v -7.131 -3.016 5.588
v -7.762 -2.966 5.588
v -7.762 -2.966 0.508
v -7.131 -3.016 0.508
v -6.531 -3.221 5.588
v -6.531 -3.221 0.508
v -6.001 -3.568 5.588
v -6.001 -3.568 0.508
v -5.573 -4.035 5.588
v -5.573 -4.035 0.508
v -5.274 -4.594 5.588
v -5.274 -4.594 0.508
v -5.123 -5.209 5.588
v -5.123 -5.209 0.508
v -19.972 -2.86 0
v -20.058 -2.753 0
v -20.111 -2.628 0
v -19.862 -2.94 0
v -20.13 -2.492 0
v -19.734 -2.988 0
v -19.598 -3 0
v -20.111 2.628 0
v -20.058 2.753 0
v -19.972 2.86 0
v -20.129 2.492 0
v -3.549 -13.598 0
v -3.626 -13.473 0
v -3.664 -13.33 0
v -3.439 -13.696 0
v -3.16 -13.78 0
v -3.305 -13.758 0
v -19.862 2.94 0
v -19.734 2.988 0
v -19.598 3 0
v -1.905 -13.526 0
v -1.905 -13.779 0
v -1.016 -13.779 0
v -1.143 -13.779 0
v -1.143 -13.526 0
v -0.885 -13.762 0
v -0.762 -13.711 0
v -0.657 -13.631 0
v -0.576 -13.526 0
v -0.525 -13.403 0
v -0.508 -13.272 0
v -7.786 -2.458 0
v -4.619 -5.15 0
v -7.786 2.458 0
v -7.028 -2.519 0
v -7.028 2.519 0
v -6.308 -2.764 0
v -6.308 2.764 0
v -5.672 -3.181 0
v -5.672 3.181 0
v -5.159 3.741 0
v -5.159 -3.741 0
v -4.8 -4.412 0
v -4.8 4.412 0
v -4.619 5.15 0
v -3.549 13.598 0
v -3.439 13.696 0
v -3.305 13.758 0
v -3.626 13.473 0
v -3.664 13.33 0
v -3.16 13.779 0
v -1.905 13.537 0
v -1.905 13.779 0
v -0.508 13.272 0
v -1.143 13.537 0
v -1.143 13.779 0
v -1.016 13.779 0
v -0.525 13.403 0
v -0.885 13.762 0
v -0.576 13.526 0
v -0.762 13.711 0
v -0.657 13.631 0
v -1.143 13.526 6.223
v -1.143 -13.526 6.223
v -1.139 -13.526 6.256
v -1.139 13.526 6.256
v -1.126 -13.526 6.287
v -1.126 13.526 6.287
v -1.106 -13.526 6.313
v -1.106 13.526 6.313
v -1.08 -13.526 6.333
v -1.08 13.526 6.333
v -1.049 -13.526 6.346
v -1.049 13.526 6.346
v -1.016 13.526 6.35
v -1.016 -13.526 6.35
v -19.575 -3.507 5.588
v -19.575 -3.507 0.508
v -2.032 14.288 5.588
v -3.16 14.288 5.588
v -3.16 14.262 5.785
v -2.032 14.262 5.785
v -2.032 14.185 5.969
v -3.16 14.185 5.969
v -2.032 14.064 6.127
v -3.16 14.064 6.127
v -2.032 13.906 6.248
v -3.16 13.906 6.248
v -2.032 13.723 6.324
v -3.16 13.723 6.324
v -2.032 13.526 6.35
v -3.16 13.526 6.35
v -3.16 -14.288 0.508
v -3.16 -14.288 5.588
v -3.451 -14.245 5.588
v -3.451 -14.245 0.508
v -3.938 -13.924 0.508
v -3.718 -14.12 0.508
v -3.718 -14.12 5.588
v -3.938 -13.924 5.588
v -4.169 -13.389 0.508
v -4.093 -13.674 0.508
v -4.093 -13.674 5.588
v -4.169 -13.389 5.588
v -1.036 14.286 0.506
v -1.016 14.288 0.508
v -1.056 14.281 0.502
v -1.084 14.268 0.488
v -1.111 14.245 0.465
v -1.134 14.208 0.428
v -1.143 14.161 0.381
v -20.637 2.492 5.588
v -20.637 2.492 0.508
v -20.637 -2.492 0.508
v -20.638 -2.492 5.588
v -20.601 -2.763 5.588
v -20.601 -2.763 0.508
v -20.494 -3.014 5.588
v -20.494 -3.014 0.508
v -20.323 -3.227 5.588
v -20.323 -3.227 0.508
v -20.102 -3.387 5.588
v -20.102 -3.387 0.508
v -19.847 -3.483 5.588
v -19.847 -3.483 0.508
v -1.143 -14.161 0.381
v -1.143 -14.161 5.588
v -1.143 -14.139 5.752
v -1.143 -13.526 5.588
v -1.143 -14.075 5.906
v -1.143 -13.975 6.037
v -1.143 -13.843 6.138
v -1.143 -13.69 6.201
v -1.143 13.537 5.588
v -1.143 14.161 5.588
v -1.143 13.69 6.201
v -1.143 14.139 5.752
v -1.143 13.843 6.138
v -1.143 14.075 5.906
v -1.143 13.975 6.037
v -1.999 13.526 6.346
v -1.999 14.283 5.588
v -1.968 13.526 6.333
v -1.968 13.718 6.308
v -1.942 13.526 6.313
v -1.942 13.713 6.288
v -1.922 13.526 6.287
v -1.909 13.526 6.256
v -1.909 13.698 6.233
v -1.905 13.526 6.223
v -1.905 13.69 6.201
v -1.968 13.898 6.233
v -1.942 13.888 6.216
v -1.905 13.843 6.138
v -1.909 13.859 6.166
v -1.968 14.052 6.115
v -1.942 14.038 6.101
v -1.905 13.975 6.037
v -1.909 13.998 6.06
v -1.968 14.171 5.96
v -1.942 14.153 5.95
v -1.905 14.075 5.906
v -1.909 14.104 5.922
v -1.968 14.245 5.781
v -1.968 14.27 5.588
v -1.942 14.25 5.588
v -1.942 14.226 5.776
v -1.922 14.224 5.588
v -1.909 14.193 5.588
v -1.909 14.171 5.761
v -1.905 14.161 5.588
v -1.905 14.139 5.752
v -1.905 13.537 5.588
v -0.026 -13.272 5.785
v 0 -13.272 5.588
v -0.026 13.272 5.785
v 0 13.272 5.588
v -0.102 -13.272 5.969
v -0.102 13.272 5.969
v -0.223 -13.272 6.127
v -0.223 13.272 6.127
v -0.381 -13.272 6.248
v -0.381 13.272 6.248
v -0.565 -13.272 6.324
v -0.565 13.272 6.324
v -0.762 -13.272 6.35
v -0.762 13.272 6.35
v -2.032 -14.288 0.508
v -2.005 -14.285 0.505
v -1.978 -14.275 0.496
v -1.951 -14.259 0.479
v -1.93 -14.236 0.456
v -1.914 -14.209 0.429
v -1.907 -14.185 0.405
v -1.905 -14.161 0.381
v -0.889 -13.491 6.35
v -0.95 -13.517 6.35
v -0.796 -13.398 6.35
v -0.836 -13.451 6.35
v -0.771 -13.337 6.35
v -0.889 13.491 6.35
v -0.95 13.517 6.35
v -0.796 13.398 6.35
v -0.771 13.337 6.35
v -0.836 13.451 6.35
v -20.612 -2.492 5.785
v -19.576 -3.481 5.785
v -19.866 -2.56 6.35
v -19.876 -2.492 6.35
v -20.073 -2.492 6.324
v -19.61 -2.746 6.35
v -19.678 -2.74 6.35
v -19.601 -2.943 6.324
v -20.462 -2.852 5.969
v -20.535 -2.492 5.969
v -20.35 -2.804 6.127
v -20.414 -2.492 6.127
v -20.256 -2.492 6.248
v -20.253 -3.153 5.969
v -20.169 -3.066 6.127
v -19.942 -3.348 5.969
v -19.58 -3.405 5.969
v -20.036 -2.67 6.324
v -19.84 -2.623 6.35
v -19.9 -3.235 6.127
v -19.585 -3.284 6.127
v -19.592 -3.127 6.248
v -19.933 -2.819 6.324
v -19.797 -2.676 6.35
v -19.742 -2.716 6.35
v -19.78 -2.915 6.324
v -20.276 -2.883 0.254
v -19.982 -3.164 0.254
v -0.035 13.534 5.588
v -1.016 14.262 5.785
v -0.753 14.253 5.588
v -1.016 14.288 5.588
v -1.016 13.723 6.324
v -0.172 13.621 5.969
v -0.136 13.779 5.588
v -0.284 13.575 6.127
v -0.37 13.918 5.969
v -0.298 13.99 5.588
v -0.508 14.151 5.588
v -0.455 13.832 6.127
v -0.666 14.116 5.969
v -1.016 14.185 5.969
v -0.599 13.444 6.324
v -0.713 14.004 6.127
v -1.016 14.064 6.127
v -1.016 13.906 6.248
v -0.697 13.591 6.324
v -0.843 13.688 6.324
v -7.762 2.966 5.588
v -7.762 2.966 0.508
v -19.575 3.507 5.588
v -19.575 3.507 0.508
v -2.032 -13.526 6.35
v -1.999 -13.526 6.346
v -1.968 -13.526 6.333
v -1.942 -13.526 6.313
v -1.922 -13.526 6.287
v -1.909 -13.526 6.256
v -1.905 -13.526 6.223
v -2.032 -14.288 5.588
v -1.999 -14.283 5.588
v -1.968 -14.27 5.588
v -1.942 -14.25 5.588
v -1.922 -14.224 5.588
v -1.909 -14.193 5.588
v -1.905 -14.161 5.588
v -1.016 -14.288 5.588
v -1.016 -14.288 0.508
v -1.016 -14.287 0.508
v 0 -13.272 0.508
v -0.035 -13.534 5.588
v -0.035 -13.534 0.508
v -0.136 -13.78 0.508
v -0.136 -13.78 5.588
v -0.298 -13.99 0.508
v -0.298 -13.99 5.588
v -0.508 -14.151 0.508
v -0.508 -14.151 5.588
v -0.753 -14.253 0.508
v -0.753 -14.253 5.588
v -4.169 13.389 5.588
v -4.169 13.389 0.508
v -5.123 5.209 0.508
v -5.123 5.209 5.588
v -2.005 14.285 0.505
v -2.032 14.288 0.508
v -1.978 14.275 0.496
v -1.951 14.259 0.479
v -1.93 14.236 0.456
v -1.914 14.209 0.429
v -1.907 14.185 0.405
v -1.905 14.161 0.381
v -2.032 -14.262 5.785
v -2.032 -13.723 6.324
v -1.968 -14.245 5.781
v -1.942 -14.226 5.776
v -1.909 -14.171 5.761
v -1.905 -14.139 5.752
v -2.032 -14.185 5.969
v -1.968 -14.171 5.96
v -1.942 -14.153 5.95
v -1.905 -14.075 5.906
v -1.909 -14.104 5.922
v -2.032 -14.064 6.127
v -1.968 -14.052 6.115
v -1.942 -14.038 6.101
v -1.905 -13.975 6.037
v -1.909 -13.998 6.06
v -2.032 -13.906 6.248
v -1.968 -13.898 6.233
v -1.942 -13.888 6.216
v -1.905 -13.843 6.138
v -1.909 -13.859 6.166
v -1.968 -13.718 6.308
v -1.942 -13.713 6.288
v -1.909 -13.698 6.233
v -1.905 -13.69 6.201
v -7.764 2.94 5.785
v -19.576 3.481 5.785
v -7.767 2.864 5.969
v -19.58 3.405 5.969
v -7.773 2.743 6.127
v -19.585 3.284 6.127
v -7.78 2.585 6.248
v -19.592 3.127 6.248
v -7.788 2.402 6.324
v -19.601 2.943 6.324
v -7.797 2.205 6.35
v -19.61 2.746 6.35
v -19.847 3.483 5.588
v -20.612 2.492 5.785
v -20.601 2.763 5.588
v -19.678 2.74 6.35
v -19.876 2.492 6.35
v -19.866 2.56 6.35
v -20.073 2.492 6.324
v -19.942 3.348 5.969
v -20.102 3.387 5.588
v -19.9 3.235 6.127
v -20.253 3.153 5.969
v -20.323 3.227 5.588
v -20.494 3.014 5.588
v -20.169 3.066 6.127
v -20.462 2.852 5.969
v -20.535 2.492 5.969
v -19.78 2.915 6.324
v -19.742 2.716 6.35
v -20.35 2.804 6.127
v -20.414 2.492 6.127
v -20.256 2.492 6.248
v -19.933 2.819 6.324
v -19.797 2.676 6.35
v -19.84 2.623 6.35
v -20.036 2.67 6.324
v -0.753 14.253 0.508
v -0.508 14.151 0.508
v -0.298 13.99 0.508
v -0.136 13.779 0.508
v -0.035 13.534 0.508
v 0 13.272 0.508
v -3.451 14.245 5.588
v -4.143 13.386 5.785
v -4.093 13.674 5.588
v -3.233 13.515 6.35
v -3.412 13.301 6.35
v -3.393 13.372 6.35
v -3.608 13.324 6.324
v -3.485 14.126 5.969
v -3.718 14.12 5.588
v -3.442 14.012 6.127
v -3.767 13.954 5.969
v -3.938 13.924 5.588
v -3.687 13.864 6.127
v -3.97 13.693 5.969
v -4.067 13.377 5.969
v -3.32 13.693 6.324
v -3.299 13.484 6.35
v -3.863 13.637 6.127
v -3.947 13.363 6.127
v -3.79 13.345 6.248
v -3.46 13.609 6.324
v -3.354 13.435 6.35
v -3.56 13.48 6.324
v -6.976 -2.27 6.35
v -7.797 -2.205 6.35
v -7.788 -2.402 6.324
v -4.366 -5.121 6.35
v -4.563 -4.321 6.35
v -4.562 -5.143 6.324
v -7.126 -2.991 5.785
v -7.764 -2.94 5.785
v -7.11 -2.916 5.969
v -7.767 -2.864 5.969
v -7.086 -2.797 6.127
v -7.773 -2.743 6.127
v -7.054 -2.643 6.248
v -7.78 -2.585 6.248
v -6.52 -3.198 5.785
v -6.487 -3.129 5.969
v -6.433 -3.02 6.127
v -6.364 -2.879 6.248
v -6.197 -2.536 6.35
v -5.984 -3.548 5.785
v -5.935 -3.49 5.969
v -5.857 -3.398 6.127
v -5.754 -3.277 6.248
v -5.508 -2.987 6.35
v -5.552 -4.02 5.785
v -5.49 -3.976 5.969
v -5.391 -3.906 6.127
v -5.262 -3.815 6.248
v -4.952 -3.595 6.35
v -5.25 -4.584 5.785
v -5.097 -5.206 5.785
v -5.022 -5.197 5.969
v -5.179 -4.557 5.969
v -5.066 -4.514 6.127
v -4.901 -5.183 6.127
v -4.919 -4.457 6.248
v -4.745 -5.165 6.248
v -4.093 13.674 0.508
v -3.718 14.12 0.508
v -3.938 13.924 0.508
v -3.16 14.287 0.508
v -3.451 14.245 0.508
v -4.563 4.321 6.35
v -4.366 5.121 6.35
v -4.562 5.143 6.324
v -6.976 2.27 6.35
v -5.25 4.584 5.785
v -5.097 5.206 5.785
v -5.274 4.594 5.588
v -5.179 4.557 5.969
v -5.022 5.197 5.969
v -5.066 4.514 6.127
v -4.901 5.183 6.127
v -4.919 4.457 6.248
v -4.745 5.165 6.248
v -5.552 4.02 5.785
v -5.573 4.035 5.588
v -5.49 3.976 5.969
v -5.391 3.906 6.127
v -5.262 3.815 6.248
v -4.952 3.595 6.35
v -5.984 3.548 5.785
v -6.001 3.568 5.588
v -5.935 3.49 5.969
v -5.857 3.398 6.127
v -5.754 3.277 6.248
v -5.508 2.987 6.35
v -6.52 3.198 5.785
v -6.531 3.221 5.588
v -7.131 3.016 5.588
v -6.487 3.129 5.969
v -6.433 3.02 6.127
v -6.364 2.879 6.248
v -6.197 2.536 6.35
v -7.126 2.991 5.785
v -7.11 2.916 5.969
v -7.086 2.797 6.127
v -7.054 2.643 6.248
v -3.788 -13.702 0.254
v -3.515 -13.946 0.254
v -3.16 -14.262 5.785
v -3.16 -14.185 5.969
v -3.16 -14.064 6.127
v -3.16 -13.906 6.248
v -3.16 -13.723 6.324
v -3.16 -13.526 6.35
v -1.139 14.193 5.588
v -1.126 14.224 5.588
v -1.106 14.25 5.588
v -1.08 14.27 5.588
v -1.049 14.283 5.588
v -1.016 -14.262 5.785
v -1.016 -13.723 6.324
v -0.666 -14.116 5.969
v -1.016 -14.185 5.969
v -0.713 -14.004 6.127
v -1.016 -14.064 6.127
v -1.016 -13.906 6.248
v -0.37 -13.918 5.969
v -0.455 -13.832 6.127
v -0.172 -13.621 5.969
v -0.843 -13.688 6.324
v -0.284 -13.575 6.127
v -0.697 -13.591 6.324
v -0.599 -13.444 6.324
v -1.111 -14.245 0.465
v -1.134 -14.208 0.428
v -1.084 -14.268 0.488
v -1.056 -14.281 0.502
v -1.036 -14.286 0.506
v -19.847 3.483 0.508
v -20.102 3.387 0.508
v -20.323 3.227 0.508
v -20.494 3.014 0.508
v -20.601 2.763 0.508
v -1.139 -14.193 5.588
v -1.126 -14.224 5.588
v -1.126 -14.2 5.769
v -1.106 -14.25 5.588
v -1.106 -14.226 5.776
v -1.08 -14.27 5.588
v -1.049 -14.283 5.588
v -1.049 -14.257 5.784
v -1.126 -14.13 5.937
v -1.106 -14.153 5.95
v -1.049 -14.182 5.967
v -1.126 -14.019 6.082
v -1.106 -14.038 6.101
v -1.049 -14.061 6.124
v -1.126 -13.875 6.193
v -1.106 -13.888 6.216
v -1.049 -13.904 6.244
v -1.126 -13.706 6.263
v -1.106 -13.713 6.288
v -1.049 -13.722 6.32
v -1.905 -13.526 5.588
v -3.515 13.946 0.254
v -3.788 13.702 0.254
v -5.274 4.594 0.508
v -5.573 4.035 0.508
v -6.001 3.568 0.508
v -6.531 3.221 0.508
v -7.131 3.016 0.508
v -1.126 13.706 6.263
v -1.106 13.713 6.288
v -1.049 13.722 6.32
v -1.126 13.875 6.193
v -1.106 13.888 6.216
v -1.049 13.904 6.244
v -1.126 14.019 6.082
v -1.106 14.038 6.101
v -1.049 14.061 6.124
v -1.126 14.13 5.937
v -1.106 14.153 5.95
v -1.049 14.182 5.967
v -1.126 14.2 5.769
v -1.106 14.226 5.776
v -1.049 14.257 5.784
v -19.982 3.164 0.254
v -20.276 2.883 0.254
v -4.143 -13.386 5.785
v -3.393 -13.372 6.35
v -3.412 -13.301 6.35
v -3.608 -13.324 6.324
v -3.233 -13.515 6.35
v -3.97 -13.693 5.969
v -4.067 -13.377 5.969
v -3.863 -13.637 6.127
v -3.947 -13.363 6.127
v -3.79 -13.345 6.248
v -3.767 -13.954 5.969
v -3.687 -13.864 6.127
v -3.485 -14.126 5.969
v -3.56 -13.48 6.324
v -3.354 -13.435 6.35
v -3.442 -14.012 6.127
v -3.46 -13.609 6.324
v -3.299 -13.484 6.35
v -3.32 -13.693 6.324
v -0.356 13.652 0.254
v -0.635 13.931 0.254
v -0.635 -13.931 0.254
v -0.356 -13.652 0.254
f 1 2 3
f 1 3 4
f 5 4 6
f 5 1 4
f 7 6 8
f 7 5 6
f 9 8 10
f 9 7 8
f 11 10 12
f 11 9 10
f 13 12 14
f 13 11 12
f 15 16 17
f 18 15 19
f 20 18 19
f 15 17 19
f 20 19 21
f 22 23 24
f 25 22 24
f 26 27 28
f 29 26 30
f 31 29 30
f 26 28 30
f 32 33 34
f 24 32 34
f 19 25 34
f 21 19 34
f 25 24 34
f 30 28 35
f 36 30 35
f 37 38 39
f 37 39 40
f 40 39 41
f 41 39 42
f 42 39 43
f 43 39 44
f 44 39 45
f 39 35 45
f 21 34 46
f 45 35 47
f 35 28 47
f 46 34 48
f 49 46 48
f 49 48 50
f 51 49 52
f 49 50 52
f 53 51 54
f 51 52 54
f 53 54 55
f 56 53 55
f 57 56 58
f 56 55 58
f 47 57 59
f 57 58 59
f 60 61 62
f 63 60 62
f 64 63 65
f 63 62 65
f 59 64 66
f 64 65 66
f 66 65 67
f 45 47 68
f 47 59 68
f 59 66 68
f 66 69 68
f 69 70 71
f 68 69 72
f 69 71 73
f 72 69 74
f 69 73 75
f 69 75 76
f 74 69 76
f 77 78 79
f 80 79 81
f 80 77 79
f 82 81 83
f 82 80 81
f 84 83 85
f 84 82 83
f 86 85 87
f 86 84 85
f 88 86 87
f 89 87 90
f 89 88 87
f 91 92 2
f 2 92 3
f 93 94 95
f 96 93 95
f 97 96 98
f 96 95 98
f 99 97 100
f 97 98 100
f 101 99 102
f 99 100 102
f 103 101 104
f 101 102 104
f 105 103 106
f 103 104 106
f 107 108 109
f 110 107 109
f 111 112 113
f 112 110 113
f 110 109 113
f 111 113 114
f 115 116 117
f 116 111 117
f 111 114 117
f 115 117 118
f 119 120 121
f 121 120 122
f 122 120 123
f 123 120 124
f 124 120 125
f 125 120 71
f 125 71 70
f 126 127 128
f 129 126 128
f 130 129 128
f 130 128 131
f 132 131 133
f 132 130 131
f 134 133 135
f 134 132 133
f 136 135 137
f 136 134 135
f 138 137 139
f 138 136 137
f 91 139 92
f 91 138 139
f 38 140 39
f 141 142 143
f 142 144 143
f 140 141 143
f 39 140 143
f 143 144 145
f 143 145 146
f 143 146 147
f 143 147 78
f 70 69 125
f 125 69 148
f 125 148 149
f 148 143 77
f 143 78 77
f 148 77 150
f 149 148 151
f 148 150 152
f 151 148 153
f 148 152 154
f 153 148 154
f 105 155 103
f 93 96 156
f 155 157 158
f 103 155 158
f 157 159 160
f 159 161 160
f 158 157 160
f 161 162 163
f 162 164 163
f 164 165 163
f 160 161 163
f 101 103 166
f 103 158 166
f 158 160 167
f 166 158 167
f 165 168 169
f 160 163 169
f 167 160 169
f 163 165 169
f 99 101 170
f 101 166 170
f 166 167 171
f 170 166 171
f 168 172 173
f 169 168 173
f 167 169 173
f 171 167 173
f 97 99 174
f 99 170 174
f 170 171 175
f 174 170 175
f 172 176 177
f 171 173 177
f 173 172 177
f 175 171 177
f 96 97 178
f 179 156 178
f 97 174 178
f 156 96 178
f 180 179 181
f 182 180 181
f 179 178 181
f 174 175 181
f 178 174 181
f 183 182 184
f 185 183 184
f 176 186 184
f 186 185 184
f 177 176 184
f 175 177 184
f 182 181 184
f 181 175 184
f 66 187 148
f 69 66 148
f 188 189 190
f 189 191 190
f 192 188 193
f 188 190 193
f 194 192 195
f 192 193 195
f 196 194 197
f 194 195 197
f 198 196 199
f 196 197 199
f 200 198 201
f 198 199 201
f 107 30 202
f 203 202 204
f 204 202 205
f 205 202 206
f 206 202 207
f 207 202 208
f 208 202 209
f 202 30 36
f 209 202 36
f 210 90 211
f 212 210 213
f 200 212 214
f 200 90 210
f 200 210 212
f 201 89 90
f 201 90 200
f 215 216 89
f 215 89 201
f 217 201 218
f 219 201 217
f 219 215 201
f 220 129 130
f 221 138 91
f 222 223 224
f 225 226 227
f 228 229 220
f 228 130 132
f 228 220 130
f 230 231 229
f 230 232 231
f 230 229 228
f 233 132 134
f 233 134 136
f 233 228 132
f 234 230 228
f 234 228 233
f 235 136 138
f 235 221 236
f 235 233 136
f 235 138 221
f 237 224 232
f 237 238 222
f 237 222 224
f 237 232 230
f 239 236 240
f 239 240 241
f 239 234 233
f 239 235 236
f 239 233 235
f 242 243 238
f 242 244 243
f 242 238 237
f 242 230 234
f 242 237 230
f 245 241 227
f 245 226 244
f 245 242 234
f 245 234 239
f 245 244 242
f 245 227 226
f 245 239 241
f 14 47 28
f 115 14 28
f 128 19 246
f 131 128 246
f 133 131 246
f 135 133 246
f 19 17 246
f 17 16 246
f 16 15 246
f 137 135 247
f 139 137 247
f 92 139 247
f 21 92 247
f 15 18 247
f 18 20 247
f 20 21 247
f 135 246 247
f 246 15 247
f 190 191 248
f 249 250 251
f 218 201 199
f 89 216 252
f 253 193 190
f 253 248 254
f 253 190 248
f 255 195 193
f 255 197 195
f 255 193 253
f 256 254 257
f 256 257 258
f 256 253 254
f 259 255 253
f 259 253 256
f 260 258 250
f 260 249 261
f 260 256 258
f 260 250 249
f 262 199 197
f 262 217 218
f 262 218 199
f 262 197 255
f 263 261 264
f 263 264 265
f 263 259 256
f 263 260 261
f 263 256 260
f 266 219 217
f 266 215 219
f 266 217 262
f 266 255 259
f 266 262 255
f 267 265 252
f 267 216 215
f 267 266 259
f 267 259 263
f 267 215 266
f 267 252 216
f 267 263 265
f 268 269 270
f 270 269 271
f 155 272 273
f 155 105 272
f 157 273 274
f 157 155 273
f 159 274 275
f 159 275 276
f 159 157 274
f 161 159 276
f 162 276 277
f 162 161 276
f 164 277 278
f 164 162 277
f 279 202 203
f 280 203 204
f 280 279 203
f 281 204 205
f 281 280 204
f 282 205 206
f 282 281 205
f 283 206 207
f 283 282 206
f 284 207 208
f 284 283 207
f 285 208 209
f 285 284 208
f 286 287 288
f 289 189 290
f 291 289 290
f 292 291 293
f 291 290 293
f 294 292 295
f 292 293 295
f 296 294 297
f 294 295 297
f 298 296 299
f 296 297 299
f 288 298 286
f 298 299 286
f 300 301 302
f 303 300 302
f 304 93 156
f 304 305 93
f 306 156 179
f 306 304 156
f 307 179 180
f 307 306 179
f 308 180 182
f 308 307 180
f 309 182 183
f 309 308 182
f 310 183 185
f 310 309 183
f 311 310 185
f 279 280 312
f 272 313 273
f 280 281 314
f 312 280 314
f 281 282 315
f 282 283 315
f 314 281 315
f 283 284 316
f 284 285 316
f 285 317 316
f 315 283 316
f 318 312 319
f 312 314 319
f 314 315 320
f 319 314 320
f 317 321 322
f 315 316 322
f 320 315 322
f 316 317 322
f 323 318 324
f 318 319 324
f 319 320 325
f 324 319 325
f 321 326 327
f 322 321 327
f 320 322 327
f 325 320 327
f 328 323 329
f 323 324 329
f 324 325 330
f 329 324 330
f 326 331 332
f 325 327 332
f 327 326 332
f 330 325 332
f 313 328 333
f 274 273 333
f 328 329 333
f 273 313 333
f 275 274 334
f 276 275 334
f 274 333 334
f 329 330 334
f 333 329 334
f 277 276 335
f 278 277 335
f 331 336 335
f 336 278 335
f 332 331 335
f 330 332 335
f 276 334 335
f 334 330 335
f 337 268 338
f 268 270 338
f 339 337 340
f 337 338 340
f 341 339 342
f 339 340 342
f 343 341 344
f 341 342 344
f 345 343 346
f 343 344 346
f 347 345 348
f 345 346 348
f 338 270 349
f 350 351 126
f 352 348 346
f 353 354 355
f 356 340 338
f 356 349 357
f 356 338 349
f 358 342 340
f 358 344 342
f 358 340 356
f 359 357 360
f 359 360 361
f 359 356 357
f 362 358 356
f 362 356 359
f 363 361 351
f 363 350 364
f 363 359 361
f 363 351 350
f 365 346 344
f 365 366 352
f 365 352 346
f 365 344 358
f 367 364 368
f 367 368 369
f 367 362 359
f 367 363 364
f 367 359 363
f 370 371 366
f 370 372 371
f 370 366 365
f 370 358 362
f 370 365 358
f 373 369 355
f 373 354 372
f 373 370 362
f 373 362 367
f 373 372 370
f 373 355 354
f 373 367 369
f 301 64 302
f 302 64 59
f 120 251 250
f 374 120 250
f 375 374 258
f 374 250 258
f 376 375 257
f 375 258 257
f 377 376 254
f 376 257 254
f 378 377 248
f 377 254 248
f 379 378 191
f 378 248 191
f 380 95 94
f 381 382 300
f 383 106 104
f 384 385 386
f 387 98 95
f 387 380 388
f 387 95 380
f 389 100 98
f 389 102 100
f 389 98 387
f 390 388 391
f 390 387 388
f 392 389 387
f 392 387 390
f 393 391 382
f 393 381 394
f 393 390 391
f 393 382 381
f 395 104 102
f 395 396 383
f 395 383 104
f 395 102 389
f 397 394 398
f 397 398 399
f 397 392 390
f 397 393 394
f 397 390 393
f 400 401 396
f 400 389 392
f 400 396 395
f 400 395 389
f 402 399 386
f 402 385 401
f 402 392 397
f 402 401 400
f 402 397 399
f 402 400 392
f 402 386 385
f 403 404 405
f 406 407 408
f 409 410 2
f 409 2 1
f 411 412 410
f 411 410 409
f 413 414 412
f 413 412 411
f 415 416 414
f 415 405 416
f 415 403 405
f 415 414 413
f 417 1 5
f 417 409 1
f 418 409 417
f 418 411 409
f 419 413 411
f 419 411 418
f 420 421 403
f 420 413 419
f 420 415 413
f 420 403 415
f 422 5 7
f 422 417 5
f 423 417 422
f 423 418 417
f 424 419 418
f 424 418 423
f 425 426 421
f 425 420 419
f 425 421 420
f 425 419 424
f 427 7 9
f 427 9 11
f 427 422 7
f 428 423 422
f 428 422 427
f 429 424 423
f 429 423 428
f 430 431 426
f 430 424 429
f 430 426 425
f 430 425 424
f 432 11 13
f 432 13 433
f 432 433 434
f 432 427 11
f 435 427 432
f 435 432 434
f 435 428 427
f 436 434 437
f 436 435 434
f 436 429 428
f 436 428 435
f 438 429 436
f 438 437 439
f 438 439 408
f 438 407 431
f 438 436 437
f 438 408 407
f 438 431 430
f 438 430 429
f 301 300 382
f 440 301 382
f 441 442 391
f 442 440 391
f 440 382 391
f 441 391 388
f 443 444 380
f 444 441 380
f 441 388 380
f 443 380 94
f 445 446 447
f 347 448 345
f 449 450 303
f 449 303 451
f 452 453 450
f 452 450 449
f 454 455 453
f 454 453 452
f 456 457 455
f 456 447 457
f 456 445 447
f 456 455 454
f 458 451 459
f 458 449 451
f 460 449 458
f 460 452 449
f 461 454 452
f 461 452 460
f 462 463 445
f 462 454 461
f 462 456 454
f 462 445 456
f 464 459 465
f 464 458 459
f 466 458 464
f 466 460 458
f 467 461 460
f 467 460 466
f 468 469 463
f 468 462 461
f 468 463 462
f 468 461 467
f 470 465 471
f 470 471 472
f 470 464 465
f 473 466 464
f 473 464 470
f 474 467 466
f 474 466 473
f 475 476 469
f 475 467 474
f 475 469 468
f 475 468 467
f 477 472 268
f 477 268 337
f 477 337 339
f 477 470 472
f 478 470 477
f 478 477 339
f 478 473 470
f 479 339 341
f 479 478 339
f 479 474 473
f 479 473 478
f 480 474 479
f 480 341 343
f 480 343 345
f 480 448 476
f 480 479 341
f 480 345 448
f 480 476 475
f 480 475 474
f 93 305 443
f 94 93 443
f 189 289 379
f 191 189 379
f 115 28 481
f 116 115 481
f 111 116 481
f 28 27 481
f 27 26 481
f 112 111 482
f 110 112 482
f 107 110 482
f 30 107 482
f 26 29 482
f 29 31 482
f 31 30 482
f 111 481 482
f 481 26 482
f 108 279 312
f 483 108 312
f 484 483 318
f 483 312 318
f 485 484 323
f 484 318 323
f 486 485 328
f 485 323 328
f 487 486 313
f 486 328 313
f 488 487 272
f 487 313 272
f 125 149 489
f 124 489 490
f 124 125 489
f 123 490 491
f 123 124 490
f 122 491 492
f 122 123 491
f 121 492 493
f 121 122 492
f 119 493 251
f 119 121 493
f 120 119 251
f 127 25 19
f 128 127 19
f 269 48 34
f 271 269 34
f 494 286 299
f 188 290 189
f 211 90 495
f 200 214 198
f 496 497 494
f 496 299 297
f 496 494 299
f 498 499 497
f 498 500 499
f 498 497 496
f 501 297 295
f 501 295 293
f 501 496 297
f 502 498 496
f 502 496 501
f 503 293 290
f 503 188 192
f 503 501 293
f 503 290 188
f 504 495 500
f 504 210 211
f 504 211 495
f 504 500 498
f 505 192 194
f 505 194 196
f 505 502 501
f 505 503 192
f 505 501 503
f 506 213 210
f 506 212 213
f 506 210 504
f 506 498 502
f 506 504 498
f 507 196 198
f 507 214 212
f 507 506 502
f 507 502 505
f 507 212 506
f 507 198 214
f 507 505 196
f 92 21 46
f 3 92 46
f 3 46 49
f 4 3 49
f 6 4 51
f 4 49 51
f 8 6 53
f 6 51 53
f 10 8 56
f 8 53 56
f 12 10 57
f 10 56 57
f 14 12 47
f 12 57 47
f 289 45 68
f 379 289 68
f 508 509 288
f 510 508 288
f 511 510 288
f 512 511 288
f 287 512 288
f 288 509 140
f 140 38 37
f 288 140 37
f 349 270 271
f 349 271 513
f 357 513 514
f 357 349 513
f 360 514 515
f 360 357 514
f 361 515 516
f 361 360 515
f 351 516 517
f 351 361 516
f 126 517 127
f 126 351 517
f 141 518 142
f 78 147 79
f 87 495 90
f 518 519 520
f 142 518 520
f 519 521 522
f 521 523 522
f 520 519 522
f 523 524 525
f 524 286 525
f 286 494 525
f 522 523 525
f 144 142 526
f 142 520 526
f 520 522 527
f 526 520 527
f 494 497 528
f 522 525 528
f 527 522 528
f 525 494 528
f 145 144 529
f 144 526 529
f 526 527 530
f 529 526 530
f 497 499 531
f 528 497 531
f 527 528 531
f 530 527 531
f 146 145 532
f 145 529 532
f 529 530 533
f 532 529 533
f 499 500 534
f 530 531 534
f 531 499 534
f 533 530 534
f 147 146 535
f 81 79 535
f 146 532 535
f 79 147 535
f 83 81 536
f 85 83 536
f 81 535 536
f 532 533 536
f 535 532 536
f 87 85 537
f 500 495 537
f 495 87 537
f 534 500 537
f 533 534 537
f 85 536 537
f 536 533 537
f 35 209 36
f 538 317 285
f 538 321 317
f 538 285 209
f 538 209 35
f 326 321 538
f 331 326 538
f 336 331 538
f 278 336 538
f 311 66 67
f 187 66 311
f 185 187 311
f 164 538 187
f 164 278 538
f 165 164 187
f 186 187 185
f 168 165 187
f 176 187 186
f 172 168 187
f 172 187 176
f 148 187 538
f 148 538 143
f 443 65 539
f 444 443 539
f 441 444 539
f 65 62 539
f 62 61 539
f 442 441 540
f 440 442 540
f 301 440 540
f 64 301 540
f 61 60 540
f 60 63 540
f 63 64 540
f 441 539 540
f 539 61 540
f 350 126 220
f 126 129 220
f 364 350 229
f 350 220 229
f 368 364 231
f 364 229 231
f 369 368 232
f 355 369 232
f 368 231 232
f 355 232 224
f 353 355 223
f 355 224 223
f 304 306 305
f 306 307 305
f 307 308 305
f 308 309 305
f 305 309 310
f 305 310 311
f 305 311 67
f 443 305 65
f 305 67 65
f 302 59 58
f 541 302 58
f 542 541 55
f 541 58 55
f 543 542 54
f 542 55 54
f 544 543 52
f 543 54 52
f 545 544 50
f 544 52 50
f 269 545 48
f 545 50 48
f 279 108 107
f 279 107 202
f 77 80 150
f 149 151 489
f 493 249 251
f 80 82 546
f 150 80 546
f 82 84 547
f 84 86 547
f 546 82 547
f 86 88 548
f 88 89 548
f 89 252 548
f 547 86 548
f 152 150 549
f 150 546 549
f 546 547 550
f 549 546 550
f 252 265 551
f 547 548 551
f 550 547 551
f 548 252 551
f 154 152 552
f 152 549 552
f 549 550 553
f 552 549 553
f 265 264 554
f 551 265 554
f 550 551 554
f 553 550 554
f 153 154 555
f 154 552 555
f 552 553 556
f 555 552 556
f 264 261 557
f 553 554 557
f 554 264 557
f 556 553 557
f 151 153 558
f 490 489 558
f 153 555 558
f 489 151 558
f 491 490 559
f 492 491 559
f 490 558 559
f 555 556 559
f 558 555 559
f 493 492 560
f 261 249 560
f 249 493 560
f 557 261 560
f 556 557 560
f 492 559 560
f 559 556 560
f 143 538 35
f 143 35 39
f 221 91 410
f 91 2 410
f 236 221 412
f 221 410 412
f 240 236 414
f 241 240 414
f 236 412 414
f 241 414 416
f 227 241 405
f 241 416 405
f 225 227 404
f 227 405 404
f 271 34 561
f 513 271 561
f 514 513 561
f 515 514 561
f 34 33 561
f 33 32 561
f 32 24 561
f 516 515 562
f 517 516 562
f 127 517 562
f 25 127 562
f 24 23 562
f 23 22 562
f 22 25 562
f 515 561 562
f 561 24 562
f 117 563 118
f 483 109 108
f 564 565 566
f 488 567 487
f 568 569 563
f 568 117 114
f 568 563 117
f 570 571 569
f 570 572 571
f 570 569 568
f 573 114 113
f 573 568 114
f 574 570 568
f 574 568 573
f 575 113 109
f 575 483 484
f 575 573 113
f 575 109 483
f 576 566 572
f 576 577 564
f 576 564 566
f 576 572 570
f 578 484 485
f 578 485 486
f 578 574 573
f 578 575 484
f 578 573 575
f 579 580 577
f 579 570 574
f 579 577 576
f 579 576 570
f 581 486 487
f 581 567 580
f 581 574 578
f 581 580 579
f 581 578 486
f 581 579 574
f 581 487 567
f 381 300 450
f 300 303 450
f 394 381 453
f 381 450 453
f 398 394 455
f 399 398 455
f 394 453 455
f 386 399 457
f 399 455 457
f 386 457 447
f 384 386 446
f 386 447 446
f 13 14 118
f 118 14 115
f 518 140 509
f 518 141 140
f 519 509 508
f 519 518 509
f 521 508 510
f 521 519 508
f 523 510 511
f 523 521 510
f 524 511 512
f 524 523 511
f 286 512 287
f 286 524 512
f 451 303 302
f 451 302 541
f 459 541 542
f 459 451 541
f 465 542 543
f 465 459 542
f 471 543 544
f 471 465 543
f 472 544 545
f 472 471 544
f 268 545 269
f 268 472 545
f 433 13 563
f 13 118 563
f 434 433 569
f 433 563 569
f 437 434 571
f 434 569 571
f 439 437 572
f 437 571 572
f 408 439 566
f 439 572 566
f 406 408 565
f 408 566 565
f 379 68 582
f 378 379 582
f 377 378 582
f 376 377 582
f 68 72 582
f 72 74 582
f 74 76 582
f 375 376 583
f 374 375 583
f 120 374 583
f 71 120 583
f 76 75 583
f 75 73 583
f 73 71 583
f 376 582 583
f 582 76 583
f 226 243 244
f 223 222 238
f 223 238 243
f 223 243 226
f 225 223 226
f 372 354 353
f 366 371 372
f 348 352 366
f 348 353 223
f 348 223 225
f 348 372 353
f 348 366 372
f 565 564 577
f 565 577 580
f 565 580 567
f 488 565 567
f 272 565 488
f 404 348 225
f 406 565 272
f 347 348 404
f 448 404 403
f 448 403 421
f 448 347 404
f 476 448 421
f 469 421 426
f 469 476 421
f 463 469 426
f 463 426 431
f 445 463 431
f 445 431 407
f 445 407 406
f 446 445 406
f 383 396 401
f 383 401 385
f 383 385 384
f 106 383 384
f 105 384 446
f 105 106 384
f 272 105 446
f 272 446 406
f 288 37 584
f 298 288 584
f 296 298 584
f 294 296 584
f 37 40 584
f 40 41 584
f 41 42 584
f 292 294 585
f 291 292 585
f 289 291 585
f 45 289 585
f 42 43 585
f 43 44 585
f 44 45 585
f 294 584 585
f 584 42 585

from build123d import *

# Parameters (mm, degrees)
F1_DEPTH = 6.35
F2_R     = 2.54
F3_R     = 1.016
F4_R     = 0.762
F5_SIZE  = 0.508
F6_W     = 0.762
F6_H     = 31.75
F7_DEPTH = 0.762
F8_W     = 0.762
F8_H     = 0.7506295204
F8_H_2   = 0.762
F9_DEPTH = 25.4
F10_R    = 0.12699


# Not quite as in the source:
# - a fillet or chamfer is up to 0.001 mm smaller than in the source, because OpenCascade refuses the exact size


with BuildPart() as f1:
    # F0 (on Top) → F1 (new body)
    with BuildSketch(Plane.XY):
        Polygon((0, -14.2875), (0, 14.2875), (-4.064, 14.2875), (-5.3975, 2.8575), (-20.6375, 3.556), (-20.6375, -3.556), (-5.3975, -2.8575), (-4.064, -14.2875), align=None)
    extrude(amount=F1_DEPTH)

    # F2
    f2_edges = [f1.edges().sort_by_distance(p)[0] for p in [
        (-5.3975, -2.8575, 3.175),
        (-5.3975, 2.8575, 3.175),
    ]]
    fillet(f2_edges, radius=F2_R)

    # F3
    f3_edges = [f1.edges().sort_by_distance(p)[0] for p in [
        (0, 14.2875, 3.175),
        (-4.064, 14.2875, 3.175),
        (0, -14.2875, 3.175),
        (-4.064, -14.2875, 3.175),
        (-20.6375, 3.556, 3.175),
        (-20.6375, -3.556, 3.175),
    ]]
    fillet(f3_edges, radius=F3_R)

    # F4
    f4_edges = [f1.edges().sort_by_distance(p)[0] for p in [
        (-4.645984, 9.299062, 6.35),
        (-3.835156, 14.030405, 6.35),
        (-6.001163, 3.567789, 6.35),
        (-2.087821, 14.2875, 6.35),
        (-13.668668, 3.236595, 6.35),
        (-0.29758, 13.98992, 6.35),
        (-20.323281, 3.22705, 6.35),
        (0, 0, 6.35),
        (-20.6375, 0, 6.35),
        (-0.29758, -13.98992, 6.35),
        (-20.323281, -3.22705, 6.35),
        (-2.087821, -14.2875, 6.35),
        (-13.668668, -3.236595, 6.35),
        (-3.835156, -14.030405, 6.35),
        (-6.001163, -3.567789, 6.35),
        (-4.645984, -9.299062, 6.35),
    ]]
    fillet(f4_edges, radius=F4_R)

    # F5
    f5_edges = [f1.edges().sort_by_distance(p)[0] for p in [
        (-4.645984, 9.299062, 0),
        (-3.835156, 14.030405, 0),
        (-6.001163, 3.567789, 0),
        (-2.087821, 14.2875, 0),
        (-13.668668, 3.236595, 0),
        (-0.29758, 13.98992, 0),
        (-20.323281, 3.22705, 0),
        (0, 0, 0),
        (-20.6375, 0, 0),
        (-0.29758, -13.98992, 0),
        (-20.323281, -3.22705, 0),
        (-2.087821, -14.2875, 0),
        (-13.668668, -3.236595, 0),
        (-3.835156, -14.030405, 0),
        (-6.001163, -3.567789, 0),
        (-4.645984, -9.299062, 0),
    ]]
    chamfer(f5_edges, length=F5_SIZE)

    # F6 (on face) → F7 (cut)
    with BuildSketch(Plane.XY.offset(6.35)):
        with Locations((-1.524, -0.5830885321)):
            Rectangle(F6_W, F6_H)
    extrude(amount=-F7_DEPTH, mode=Mode.SUBTRACT)

    # F8 (on face) → F9 (cut)
    with BuildSketch(Plane.XY.offset(5.588)):
        with Locations((-1.524, 13.9121852398)):
            Rectangle(F8_W, F8_H)
        with Locations((-1.524, -13.9065)):
            Rectangle(F8_W, F8_H_2)
    extrude(amount=-F9_DEPTH, mode=Mode.SUBTRACT)

    # F10 (radius 0.127 in the source; OpenCascade refuses exactly that, so slightly less here)
    f10_edges = [f1.edges().sort_by_distance(p)[0] for p in [
        (-1.143, 0, 6.35),
        (-1.905, 0, 6.35),
    ]]
    fillet(f10_edges, radius=F10_R)


solid = f1.part
